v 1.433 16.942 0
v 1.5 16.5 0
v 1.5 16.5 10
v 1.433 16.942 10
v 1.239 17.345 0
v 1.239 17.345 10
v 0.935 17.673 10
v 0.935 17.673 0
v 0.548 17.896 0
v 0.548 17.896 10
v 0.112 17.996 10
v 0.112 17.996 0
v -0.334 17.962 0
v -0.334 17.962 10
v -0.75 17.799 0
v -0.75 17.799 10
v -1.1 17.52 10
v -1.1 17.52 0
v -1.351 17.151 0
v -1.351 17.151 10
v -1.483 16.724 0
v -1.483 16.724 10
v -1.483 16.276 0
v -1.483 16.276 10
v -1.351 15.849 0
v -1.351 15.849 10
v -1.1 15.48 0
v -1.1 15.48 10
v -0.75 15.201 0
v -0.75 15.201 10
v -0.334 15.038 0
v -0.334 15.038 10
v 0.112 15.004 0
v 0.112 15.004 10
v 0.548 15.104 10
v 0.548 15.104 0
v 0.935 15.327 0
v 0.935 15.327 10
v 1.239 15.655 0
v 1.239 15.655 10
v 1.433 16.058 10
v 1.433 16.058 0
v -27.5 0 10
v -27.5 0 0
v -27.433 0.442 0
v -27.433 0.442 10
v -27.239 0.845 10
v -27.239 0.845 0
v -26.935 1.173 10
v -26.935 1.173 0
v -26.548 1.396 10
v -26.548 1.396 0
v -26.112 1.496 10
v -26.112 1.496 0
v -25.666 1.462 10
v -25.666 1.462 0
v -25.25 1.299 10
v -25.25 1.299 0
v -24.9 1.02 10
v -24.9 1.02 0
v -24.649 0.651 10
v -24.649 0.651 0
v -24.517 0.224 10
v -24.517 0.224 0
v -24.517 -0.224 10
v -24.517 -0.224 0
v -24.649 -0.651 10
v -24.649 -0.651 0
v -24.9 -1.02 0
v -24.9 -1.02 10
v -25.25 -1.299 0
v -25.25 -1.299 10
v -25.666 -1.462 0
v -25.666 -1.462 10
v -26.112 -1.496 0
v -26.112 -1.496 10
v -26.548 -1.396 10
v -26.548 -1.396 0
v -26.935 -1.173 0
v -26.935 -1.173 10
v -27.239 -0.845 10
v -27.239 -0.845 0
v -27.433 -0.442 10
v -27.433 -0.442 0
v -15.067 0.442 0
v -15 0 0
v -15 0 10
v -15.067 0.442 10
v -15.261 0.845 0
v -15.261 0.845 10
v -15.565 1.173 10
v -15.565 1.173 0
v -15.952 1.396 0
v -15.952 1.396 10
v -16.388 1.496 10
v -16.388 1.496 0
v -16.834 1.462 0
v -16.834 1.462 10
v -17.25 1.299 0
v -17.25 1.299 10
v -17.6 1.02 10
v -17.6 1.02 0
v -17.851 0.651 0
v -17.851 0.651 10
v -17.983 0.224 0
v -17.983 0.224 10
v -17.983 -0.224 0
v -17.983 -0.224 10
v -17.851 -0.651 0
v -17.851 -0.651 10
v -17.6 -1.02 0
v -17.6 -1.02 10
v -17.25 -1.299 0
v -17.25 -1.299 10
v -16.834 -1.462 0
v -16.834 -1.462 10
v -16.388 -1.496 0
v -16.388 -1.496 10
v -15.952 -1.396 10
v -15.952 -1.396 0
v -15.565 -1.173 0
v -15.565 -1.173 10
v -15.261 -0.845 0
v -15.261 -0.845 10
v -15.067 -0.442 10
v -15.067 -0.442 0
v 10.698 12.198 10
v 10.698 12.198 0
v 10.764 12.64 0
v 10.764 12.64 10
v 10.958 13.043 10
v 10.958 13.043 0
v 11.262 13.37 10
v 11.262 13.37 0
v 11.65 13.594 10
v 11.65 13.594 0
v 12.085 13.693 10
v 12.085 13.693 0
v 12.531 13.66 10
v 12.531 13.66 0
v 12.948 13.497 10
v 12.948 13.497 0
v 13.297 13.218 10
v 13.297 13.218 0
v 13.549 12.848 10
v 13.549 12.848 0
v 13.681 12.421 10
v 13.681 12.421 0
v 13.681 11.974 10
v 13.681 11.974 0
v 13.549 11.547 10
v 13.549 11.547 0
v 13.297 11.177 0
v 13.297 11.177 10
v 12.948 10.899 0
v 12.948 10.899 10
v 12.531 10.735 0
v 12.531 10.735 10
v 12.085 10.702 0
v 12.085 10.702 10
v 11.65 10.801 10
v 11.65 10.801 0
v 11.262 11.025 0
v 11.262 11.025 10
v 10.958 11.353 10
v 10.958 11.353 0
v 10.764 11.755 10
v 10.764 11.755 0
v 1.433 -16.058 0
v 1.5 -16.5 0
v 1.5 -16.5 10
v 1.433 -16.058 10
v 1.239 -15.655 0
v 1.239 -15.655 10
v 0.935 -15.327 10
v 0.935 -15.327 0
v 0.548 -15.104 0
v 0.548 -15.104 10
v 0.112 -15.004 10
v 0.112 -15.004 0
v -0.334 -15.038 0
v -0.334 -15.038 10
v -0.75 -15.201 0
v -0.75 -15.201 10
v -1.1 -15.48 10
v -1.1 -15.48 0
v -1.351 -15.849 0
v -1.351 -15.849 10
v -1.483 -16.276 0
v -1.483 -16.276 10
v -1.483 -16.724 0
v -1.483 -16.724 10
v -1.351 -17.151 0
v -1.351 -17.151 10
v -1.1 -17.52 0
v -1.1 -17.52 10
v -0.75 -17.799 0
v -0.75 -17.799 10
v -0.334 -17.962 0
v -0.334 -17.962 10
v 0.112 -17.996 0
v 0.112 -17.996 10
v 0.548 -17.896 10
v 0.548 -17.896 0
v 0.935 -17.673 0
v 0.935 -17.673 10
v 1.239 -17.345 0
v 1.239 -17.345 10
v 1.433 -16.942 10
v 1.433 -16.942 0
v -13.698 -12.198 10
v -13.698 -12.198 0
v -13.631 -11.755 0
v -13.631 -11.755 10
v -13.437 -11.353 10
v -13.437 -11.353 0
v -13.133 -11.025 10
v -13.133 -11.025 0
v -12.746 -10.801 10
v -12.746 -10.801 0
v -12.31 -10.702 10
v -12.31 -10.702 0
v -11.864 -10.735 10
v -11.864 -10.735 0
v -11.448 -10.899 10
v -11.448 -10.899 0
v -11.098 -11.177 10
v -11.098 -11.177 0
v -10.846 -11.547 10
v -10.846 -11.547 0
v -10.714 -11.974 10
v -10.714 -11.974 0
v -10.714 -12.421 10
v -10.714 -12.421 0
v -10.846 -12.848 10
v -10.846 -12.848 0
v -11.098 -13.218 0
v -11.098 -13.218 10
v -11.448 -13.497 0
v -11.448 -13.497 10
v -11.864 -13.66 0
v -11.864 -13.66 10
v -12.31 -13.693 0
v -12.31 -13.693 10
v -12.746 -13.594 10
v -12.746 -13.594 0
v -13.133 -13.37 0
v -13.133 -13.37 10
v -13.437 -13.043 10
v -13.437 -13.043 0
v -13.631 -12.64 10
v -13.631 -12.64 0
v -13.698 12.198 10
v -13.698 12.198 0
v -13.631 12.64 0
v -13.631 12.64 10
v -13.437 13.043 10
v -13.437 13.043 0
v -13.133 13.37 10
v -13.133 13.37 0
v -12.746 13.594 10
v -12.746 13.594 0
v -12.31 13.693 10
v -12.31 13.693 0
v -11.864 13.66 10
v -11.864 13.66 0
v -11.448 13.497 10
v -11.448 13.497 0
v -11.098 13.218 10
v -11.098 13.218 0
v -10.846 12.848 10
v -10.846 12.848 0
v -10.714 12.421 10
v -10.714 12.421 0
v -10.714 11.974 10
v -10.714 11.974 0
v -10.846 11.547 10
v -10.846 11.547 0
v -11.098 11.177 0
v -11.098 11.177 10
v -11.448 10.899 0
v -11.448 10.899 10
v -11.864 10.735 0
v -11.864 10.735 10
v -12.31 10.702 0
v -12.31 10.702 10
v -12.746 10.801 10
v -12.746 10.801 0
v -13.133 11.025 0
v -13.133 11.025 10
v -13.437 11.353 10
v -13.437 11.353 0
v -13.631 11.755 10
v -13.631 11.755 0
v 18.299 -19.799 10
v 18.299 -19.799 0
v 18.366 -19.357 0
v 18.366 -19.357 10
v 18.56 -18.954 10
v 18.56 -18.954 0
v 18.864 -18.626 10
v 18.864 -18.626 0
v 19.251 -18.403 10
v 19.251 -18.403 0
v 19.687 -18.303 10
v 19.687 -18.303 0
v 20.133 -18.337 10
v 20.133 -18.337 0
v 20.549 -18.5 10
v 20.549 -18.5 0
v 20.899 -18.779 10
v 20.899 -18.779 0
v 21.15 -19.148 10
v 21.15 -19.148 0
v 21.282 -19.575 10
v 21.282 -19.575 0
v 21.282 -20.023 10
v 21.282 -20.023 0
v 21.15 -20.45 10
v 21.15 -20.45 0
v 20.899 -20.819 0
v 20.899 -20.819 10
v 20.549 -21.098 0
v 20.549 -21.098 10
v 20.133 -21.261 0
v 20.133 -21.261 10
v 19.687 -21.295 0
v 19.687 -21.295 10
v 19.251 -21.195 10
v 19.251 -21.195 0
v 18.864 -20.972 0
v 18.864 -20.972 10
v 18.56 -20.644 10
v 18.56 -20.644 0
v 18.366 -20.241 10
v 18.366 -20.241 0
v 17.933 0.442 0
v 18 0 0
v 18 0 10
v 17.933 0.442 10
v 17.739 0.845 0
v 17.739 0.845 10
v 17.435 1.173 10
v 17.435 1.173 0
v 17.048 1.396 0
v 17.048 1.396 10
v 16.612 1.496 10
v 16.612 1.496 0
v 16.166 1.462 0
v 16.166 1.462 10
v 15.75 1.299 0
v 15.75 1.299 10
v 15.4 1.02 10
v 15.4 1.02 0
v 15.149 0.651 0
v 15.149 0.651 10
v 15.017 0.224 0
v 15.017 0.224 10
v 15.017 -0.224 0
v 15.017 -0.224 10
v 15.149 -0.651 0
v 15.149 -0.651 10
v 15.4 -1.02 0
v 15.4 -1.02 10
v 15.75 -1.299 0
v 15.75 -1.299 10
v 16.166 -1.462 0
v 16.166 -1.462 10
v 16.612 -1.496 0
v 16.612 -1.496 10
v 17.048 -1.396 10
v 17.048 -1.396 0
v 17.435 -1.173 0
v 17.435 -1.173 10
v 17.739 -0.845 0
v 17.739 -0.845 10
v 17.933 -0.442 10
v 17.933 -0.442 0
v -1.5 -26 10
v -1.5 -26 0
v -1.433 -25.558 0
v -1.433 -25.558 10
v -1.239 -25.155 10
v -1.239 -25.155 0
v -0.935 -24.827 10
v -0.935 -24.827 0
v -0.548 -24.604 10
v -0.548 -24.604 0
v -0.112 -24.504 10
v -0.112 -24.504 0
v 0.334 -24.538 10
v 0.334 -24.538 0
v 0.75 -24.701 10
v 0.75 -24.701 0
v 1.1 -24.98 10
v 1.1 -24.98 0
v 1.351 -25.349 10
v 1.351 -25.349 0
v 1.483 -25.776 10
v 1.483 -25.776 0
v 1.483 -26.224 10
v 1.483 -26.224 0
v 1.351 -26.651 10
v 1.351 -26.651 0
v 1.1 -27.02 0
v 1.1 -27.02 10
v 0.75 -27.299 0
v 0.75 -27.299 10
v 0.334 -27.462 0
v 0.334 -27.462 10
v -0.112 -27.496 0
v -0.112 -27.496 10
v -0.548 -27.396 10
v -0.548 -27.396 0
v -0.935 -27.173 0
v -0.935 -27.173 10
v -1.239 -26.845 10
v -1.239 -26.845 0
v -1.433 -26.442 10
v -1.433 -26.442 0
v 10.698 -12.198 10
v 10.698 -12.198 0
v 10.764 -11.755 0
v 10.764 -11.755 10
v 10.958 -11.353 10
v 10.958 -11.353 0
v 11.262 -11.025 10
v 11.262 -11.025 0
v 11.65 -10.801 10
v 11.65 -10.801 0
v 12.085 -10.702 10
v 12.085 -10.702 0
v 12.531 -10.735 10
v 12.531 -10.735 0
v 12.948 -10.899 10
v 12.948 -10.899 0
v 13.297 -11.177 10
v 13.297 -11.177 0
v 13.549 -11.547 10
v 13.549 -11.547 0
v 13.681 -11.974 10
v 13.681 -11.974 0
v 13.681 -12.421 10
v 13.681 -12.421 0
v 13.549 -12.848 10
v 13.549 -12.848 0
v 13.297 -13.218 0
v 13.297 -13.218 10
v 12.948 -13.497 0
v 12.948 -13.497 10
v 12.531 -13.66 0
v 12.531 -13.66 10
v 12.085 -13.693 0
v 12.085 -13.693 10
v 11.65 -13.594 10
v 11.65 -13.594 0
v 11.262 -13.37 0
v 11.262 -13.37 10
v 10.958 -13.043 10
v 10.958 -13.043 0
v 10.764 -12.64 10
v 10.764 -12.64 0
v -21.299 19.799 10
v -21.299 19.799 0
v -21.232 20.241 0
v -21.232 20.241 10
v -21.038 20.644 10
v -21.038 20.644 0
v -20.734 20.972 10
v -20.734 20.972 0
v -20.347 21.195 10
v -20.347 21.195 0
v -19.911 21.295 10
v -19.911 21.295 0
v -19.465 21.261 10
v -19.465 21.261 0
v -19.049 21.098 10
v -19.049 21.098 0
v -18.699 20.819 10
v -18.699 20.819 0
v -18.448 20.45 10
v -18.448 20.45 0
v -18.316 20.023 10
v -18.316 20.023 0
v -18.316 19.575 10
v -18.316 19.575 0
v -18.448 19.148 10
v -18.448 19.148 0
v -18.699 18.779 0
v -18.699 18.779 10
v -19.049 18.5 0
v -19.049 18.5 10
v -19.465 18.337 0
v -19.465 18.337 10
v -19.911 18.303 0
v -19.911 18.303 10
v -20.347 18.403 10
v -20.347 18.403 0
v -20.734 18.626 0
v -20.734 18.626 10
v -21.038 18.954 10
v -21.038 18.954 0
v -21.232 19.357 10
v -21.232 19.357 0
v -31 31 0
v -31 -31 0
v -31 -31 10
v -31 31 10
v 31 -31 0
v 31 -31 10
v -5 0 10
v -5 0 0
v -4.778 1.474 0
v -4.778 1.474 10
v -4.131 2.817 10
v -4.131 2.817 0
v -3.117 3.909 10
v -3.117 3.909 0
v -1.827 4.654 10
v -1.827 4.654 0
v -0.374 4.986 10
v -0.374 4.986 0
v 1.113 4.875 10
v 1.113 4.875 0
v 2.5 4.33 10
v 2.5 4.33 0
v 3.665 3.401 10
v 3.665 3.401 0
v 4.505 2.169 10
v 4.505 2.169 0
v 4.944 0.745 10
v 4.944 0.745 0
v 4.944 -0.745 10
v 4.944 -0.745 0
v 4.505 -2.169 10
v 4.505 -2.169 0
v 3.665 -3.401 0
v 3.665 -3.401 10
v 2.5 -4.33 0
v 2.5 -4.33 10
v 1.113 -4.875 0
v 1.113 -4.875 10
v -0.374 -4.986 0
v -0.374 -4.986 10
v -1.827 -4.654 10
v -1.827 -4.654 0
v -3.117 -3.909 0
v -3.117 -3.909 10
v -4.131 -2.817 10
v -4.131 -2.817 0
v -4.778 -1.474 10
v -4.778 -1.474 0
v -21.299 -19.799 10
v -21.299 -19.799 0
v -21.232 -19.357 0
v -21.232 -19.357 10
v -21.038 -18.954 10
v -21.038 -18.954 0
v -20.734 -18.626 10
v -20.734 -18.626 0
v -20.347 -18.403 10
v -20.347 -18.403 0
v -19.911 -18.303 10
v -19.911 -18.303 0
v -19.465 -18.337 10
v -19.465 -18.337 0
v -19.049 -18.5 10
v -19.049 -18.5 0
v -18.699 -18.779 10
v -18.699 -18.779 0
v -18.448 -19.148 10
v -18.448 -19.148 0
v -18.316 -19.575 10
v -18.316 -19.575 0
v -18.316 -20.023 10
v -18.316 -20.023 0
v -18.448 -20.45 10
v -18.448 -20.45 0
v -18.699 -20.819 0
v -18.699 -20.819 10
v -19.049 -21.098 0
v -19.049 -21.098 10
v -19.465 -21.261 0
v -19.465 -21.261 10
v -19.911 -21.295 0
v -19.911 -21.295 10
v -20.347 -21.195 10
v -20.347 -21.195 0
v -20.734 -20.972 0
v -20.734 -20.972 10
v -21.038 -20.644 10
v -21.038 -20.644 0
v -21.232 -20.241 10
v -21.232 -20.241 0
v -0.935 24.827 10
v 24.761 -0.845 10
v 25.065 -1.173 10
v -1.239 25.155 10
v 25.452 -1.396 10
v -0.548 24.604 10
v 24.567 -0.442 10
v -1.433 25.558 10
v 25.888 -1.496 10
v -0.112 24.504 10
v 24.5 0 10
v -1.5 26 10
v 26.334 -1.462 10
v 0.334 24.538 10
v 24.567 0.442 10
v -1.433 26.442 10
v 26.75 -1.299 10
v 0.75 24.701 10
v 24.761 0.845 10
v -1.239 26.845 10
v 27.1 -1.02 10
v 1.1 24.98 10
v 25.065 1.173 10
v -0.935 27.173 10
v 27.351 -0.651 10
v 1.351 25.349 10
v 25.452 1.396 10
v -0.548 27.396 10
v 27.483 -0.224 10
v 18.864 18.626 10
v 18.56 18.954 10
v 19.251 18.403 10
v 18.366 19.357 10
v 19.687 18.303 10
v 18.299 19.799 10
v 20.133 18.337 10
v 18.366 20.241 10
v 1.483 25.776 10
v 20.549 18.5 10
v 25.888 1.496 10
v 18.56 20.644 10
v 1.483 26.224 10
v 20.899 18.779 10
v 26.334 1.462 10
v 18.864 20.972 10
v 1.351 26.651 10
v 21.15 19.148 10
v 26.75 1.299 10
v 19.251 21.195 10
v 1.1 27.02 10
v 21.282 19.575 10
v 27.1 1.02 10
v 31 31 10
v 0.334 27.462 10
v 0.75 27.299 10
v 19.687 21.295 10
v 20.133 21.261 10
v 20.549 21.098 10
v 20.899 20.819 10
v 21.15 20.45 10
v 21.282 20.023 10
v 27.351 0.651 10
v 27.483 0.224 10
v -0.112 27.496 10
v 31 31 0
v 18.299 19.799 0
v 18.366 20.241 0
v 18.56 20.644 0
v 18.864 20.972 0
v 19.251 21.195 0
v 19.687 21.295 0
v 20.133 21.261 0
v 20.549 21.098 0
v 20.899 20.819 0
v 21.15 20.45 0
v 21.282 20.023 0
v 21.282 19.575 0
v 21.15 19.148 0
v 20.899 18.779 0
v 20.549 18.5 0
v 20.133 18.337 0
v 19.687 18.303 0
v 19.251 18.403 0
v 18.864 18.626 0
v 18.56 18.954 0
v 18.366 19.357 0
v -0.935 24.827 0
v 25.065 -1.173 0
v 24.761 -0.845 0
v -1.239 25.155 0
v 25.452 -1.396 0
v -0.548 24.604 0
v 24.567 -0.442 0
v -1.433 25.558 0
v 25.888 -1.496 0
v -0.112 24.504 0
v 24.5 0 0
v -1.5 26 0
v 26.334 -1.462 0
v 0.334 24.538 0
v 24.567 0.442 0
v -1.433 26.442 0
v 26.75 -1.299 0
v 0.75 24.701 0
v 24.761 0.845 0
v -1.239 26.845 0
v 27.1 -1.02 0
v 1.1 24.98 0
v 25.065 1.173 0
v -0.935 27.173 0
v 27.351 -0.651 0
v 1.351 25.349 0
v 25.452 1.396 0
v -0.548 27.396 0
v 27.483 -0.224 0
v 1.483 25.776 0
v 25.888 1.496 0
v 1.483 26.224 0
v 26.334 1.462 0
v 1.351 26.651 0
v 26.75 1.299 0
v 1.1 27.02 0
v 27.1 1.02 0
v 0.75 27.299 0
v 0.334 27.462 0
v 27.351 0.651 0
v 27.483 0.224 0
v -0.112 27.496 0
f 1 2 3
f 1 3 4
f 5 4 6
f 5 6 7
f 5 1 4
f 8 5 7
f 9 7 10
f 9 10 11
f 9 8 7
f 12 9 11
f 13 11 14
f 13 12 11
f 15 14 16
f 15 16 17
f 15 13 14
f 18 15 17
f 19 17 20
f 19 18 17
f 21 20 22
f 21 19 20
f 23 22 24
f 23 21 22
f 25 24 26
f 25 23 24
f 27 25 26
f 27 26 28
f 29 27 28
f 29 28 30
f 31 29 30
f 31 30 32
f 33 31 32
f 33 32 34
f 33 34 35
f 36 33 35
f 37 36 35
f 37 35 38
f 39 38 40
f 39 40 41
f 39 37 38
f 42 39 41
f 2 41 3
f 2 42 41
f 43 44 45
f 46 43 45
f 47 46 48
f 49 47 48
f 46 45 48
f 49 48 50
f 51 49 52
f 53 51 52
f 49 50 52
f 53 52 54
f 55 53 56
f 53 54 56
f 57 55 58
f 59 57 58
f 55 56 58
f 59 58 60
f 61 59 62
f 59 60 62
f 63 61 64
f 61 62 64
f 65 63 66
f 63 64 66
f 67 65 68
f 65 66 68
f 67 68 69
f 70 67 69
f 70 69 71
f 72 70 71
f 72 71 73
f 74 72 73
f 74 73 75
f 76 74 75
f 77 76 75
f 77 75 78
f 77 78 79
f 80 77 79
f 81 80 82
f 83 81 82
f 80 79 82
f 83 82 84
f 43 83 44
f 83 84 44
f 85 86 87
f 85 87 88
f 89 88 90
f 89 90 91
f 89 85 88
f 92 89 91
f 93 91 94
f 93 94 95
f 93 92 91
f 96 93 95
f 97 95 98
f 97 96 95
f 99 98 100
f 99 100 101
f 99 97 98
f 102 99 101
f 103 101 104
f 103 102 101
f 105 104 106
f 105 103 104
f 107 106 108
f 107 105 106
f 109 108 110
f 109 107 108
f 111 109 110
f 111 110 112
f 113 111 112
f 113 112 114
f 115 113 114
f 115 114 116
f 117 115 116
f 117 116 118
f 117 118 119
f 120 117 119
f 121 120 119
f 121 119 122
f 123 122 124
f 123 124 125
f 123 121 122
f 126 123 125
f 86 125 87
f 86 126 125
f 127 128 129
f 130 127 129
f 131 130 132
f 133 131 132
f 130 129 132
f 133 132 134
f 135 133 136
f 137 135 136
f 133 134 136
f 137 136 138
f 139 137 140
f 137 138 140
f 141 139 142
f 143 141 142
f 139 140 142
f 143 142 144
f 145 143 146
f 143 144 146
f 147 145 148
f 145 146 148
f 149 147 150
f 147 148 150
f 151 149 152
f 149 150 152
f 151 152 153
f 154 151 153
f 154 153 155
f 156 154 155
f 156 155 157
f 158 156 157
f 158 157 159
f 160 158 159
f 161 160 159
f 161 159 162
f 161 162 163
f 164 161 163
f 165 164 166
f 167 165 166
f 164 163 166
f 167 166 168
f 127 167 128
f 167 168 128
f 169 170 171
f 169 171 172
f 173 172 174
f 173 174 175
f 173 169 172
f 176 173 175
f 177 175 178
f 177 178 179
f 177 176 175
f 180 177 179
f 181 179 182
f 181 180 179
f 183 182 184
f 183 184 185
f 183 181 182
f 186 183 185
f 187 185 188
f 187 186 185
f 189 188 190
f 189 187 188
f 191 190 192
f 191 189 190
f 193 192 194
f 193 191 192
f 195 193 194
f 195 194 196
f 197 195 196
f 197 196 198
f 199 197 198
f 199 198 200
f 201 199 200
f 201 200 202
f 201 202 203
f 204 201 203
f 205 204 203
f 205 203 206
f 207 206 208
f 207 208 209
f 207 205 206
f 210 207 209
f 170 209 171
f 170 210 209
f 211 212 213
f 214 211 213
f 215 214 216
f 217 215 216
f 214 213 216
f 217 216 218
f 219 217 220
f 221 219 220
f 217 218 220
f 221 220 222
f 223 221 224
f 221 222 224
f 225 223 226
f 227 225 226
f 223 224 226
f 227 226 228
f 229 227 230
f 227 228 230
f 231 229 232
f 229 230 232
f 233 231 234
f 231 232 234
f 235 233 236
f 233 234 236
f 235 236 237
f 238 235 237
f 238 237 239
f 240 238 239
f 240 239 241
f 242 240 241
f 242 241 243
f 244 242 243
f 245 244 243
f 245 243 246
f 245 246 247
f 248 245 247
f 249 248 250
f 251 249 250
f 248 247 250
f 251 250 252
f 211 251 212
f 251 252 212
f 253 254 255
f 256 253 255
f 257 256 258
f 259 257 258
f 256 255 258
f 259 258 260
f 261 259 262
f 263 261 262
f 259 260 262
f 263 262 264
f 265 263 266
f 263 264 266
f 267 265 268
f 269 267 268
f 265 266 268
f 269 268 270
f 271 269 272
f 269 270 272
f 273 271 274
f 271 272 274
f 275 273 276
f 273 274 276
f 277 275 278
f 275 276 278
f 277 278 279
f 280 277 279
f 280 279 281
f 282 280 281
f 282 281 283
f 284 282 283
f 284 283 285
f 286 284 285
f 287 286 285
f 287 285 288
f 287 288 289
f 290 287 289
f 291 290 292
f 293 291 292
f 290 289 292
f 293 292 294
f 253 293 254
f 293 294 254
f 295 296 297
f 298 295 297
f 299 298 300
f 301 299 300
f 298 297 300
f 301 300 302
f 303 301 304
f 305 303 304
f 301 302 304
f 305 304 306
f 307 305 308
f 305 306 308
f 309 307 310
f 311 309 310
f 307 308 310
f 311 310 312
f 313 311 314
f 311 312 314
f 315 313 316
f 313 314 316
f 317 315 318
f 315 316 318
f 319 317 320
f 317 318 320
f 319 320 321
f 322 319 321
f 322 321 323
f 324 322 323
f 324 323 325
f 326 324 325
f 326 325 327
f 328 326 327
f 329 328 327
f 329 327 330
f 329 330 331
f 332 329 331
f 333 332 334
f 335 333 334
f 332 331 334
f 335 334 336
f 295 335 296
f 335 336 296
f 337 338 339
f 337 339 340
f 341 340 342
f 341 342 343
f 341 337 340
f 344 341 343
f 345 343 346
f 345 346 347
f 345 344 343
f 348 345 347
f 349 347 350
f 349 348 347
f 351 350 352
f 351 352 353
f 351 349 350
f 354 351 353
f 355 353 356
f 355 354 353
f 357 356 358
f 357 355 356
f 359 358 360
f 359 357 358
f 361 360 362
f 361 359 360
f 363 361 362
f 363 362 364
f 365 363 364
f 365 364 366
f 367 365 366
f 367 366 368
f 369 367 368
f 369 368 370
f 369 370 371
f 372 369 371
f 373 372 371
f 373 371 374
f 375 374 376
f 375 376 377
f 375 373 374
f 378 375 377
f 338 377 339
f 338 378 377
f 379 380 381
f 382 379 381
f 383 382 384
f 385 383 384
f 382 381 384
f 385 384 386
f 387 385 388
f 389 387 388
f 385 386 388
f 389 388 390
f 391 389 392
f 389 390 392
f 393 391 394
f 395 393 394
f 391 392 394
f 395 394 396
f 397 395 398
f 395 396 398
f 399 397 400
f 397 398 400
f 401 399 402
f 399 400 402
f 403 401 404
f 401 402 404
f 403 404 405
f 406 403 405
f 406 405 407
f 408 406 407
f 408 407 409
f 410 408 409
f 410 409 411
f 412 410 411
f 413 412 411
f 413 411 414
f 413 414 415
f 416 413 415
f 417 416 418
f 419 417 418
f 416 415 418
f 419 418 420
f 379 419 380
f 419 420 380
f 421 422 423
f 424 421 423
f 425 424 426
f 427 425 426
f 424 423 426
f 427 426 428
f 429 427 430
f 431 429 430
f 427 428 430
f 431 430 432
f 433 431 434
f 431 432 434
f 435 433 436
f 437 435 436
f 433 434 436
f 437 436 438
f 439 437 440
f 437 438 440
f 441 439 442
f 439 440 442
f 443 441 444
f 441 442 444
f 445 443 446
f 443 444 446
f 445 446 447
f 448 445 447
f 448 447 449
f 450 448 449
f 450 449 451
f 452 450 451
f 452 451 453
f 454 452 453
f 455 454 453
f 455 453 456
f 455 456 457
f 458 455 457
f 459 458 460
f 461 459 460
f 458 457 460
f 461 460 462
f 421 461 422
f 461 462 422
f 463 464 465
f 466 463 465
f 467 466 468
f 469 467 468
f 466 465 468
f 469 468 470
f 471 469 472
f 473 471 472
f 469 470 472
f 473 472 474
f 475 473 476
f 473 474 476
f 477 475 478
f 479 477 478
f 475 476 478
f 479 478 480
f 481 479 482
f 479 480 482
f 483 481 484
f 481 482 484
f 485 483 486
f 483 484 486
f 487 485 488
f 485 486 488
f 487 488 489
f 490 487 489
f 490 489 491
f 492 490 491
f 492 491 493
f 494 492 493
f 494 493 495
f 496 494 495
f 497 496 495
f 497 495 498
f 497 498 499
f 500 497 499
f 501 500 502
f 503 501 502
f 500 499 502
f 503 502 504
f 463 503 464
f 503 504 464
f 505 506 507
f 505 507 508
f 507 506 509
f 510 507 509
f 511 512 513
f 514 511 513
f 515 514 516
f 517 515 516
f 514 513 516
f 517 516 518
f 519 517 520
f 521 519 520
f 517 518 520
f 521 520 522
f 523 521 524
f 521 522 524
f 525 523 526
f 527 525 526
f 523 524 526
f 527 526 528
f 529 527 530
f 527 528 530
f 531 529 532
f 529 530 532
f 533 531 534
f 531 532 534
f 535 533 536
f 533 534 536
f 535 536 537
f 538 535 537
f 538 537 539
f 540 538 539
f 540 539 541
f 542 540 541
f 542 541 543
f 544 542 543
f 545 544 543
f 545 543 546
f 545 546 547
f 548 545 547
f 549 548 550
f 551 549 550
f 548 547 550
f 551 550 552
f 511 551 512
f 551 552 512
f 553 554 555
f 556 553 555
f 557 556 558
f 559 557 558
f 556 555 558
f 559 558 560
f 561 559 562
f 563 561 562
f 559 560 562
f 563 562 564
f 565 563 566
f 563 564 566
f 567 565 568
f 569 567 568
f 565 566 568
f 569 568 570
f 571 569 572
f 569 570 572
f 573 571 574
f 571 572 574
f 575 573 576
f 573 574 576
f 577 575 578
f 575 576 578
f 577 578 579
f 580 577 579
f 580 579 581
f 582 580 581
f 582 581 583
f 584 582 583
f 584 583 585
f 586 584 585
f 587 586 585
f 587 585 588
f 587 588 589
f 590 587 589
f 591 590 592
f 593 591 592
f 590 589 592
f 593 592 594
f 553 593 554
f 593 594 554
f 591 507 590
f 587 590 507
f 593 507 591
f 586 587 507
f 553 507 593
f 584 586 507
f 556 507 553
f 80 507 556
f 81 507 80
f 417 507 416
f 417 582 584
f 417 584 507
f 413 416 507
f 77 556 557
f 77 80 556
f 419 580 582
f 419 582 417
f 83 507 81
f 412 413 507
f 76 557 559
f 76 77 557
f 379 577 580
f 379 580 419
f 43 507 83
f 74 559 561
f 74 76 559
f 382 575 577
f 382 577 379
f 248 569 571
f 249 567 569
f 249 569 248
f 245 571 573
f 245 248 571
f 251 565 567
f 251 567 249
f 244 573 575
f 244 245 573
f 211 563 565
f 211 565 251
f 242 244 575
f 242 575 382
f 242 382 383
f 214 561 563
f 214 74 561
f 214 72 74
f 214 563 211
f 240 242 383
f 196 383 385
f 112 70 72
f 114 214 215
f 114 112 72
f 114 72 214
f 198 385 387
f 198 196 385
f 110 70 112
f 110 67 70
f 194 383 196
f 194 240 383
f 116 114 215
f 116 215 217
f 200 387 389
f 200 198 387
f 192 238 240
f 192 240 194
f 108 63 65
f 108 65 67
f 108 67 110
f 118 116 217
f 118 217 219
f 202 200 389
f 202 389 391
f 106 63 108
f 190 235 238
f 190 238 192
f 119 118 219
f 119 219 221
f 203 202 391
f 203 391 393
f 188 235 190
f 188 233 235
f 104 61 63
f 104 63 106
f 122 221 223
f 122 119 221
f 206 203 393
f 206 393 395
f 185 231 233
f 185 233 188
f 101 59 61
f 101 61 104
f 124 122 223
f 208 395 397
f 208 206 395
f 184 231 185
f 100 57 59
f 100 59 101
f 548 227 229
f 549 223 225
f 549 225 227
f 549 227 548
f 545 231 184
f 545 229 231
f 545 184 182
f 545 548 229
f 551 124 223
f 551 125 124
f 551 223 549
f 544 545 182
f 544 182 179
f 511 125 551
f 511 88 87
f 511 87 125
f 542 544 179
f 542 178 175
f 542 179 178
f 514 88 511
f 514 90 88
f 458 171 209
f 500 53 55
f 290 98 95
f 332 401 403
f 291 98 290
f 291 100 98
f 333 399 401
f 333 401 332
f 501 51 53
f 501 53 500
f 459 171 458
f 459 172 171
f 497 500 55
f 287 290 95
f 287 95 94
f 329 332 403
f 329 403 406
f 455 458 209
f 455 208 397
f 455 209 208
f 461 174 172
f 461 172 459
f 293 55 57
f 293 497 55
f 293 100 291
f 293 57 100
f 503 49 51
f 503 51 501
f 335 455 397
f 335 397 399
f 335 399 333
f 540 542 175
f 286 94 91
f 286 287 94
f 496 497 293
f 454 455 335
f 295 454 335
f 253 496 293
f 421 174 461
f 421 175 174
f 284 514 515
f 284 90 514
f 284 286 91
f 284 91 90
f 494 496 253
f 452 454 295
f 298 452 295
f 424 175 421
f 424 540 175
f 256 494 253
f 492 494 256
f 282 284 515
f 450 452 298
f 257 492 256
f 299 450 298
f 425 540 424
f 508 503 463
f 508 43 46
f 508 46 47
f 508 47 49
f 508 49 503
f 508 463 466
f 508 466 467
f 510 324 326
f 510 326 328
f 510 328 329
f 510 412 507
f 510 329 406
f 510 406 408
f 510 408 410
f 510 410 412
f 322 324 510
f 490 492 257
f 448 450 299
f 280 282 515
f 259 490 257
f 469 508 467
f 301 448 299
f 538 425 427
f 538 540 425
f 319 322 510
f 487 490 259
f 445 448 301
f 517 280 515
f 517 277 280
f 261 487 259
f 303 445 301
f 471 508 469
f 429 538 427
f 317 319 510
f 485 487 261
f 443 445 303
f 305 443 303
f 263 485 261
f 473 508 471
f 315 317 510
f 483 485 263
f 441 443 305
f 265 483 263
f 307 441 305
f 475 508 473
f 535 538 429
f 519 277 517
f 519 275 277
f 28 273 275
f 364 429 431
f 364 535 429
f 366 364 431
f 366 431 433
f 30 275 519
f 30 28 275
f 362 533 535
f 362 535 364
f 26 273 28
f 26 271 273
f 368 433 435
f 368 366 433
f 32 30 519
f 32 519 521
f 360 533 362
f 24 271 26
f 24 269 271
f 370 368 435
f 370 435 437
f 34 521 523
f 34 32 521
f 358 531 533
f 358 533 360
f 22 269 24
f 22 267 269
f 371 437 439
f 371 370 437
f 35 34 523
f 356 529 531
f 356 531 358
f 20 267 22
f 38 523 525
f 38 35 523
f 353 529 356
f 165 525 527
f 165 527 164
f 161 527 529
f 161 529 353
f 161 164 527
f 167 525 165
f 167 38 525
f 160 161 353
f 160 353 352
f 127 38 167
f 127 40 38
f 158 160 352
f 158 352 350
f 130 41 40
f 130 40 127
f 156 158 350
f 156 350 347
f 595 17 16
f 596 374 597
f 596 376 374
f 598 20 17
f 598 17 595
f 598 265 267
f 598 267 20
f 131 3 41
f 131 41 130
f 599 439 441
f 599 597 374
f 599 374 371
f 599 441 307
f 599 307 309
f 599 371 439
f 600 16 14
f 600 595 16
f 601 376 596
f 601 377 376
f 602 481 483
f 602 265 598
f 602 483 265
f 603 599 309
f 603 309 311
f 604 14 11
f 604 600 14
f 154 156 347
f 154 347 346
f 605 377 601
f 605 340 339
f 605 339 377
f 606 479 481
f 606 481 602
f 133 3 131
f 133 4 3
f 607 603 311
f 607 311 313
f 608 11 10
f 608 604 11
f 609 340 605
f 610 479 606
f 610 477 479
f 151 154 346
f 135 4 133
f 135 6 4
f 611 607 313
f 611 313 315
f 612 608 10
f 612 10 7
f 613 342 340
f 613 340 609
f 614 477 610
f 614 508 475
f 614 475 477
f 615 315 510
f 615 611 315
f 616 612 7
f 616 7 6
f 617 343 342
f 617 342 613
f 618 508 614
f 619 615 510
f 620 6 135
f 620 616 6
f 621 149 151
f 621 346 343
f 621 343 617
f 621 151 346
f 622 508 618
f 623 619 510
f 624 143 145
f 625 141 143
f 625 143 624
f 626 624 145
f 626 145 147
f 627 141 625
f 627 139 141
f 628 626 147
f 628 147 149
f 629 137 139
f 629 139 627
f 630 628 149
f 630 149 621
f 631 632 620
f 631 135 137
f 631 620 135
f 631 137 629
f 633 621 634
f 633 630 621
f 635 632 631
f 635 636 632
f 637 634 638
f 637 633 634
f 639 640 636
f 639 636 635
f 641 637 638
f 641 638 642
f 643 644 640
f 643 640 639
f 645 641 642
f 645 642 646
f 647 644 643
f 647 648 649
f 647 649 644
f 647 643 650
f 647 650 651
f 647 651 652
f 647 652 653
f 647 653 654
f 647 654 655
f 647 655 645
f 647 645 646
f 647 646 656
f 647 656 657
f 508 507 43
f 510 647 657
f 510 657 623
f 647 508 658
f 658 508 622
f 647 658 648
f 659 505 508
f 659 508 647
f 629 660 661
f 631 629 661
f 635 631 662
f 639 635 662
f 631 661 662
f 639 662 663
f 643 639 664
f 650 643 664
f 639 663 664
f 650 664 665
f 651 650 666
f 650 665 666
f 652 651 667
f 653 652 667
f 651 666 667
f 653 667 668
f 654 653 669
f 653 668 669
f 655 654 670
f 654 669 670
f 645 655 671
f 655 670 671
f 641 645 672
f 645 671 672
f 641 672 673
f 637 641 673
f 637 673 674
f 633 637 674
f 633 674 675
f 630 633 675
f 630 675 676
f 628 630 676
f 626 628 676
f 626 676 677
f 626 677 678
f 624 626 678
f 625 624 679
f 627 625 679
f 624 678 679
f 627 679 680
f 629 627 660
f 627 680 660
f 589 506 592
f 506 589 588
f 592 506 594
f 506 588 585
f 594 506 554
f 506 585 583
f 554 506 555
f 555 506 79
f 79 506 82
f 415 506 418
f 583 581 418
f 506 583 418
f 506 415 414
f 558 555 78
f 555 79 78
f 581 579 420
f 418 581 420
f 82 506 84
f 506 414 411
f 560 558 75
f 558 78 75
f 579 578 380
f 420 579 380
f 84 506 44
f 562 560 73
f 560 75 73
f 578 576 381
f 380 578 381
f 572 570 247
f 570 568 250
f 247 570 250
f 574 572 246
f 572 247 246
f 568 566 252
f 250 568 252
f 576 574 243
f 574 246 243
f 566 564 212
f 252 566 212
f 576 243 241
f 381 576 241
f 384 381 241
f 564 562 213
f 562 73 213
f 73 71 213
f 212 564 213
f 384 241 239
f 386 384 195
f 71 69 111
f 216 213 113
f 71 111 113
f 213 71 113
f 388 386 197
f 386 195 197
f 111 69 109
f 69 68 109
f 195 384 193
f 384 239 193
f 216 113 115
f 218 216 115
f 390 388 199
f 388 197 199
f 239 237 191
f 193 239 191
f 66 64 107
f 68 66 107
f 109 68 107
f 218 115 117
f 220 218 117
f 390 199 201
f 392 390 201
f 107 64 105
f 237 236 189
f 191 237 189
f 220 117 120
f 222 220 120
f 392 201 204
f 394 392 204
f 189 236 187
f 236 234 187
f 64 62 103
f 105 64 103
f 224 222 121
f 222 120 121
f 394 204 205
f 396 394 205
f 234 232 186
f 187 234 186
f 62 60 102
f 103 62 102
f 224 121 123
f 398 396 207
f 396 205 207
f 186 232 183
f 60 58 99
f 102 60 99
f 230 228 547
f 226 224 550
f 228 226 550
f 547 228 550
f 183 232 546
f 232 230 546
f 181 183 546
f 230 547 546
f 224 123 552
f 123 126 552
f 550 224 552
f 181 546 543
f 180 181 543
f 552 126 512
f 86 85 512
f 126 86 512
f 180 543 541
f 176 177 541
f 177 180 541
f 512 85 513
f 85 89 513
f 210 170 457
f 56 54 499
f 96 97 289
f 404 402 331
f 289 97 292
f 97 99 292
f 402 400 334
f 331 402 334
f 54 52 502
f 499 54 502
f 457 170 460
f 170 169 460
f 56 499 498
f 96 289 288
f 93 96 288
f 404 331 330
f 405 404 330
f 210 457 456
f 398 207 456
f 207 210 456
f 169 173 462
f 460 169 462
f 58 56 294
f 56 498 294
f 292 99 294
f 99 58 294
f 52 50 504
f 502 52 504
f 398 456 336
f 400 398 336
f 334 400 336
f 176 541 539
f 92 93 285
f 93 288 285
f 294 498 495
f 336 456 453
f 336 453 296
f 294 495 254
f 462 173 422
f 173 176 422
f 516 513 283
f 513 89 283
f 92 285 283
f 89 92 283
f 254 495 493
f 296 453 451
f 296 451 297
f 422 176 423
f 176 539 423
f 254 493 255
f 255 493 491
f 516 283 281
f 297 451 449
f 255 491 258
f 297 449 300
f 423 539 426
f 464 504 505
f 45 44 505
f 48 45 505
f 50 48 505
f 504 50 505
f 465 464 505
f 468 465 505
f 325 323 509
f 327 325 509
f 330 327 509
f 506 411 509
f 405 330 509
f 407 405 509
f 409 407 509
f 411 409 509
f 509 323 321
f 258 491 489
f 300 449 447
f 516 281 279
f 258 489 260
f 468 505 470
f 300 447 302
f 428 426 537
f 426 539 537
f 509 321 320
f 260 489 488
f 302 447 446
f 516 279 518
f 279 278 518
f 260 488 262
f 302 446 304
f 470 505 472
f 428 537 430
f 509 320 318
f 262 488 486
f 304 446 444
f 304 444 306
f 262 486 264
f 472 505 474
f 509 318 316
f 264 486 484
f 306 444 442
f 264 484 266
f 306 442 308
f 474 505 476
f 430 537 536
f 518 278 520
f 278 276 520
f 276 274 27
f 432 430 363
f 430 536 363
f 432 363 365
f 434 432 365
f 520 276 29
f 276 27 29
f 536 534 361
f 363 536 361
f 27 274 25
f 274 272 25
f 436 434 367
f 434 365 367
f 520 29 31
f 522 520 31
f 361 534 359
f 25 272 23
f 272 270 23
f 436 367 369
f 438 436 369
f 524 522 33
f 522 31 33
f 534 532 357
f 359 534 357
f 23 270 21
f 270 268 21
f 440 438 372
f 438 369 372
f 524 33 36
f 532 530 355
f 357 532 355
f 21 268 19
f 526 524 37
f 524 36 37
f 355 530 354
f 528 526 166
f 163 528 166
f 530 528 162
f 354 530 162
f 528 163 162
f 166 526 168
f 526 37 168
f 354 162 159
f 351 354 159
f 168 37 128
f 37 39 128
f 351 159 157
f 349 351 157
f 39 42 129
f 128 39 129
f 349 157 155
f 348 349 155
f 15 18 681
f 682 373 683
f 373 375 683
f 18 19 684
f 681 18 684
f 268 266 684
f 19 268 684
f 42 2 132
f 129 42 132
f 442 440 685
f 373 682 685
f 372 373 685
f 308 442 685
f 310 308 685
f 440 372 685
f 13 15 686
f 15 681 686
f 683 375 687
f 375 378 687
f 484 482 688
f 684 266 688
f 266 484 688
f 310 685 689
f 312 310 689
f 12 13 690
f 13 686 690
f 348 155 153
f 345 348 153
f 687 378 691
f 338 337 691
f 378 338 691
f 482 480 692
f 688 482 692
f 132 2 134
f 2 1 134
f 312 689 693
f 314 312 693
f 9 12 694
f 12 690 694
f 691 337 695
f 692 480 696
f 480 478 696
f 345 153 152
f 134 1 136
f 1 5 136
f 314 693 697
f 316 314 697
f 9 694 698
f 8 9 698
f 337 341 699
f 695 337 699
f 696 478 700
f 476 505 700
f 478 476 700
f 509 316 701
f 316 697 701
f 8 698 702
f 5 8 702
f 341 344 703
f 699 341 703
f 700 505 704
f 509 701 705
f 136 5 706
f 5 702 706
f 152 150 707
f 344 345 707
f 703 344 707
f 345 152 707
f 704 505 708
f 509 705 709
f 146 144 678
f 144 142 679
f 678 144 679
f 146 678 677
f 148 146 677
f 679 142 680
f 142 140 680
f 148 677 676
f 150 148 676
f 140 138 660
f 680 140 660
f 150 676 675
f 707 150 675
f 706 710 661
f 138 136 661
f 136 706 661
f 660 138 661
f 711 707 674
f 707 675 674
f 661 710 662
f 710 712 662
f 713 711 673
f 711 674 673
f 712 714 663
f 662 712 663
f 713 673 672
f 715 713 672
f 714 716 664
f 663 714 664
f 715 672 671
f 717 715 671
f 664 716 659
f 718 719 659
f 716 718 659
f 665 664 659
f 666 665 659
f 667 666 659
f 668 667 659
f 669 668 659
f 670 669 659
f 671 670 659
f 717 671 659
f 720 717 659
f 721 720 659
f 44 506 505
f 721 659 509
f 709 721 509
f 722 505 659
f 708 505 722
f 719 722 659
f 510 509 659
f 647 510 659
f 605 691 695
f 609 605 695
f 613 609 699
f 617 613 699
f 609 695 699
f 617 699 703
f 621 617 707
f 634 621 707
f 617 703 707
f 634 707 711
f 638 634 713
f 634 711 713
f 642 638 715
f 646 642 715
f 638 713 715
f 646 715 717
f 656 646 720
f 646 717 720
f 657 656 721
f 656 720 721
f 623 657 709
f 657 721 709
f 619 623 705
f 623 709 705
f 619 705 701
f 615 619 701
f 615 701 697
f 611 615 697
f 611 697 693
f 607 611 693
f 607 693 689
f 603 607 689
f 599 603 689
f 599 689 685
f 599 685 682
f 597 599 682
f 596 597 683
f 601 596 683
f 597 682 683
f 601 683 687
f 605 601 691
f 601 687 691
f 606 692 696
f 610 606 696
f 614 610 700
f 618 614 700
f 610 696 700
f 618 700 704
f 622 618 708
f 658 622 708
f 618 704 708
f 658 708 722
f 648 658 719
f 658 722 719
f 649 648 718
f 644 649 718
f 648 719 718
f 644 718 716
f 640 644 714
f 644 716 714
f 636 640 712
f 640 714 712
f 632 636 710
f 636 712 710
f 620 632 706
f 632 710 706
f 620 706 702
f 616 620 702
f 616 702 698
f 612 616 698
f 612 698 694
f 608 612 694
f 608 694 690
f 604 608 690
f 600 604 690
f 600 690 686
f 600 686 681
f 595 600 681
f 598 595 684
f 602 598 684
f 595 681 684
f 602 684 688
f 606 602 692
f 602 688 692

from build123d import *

# Parameters (mm, degrees)
SKETCH1_W           = 62
SKETCH1_H           = 62
SKETCH1_R           = 1.5
BOSS_EXTRUDE1_DEPTH = 10
SKETCH2_R           = 1.5
CUT_EXTRUDE1_DEPTH  = 10
SKETCH3_R           = 1.5
CUT_EXTRUDE2_DEPTH  = 10
SKETCH4_R           = 5
SKETCH4_R_2         = 1.5
CUT_EXTRUDE3_DEPTH  = 10


with BuildPart() as part:
    # Sketch1 → Boss-Extrude1 (new body)
    with BuildSketch(Plane.XY):
        Rectangle(SKETCH1_W, SKETCH1_H)
        with Locations((0, 16.5)):
            Circle(SKETCH1_R, mode=Mode.SUBTRACT)
        with Locations((16.5, 0)):
            Circle(SKETCH1_R, mode=Mode.SUBTRACT)
        with Locations((0, -16.5)):
            Circle(SKETCH1_R, mode=Mode.SUBTRACT)
        with Locations((-16.5, 0)):
            Circle(SKETCH1_R, mode=Mode.SUBTRACT)
    extrude(amount=BOSS_EXTRUDE1_DEPTH)

    # Sketch2 → Cut-Extrude1 (cut)
    with BuildSketch(Plane(origin=(0, 0, 0), x_dir=(-1, 0, 0), z_dir=(0, 0, -1))):
        with Locations((-12.197591975, 12.197591975)):
            Circle(SKETCH2_R)
        with Locations((-12.197591975, -12.197591975)):
            Circle(SKETCH2_R)
        with Locations((12.197591975, -12.197591975)):
            Circle(SKETCH2_R)
        with Locations((12.197591975, 12.197591975)):
            Circle(SKETCH2_R)
    extrude(amount=-CUT_EXTRUDE1_DEPTH, mode=Mode.SUBTRACT)

    # Sketch3 → Cut-Extrude2 (cut)
    with BuildSketch(Plane(origin=(0, 0, 0), x_dir=(-1, 0, 0), z_dir=(0, 0, -1))):
        with Locations((-26, 0)):
            Circle(SKETCH3_R)
        with Locations((0, 26)):
            Circle(SKETCH3_R)
        with Locations((26, 0)):
            Circle(SKETCH3_R)
        with Locations((0, -26)):
            Circle(SKETCH3_R)
    extrude(amount=-CUT_EXTRUDE2_DEPTH, mode=Mode.SUBTRACT)

    # Sketch4 → Cut-Extrude3 (cut)
    with BuildSketch(Plane(origin=(0, 0, 0), x_dir=(-1, 0, 0), z_dir=(0, 0, -1))):
        Circle(SKETCH4_R)
        with Locations((-19.798989873, 19.798989873)):
            Circle(SKETCH4_R_2)
        with Locations((19.798989873, 19.798989873)):
            Circle(SKETCH4_R_2)
        with Locations((19.798989873, -19.798989873)):
            Circle(SKETCH4_R_2)
        with Locations((-19.798989873, -19.798989873)):
            Circle(SKETCH4_R_2)
    extrude(amount=-CUT_EXTRUDE3_DEPTH, mode=Mode.SUBTRACT)


solid = part.part
